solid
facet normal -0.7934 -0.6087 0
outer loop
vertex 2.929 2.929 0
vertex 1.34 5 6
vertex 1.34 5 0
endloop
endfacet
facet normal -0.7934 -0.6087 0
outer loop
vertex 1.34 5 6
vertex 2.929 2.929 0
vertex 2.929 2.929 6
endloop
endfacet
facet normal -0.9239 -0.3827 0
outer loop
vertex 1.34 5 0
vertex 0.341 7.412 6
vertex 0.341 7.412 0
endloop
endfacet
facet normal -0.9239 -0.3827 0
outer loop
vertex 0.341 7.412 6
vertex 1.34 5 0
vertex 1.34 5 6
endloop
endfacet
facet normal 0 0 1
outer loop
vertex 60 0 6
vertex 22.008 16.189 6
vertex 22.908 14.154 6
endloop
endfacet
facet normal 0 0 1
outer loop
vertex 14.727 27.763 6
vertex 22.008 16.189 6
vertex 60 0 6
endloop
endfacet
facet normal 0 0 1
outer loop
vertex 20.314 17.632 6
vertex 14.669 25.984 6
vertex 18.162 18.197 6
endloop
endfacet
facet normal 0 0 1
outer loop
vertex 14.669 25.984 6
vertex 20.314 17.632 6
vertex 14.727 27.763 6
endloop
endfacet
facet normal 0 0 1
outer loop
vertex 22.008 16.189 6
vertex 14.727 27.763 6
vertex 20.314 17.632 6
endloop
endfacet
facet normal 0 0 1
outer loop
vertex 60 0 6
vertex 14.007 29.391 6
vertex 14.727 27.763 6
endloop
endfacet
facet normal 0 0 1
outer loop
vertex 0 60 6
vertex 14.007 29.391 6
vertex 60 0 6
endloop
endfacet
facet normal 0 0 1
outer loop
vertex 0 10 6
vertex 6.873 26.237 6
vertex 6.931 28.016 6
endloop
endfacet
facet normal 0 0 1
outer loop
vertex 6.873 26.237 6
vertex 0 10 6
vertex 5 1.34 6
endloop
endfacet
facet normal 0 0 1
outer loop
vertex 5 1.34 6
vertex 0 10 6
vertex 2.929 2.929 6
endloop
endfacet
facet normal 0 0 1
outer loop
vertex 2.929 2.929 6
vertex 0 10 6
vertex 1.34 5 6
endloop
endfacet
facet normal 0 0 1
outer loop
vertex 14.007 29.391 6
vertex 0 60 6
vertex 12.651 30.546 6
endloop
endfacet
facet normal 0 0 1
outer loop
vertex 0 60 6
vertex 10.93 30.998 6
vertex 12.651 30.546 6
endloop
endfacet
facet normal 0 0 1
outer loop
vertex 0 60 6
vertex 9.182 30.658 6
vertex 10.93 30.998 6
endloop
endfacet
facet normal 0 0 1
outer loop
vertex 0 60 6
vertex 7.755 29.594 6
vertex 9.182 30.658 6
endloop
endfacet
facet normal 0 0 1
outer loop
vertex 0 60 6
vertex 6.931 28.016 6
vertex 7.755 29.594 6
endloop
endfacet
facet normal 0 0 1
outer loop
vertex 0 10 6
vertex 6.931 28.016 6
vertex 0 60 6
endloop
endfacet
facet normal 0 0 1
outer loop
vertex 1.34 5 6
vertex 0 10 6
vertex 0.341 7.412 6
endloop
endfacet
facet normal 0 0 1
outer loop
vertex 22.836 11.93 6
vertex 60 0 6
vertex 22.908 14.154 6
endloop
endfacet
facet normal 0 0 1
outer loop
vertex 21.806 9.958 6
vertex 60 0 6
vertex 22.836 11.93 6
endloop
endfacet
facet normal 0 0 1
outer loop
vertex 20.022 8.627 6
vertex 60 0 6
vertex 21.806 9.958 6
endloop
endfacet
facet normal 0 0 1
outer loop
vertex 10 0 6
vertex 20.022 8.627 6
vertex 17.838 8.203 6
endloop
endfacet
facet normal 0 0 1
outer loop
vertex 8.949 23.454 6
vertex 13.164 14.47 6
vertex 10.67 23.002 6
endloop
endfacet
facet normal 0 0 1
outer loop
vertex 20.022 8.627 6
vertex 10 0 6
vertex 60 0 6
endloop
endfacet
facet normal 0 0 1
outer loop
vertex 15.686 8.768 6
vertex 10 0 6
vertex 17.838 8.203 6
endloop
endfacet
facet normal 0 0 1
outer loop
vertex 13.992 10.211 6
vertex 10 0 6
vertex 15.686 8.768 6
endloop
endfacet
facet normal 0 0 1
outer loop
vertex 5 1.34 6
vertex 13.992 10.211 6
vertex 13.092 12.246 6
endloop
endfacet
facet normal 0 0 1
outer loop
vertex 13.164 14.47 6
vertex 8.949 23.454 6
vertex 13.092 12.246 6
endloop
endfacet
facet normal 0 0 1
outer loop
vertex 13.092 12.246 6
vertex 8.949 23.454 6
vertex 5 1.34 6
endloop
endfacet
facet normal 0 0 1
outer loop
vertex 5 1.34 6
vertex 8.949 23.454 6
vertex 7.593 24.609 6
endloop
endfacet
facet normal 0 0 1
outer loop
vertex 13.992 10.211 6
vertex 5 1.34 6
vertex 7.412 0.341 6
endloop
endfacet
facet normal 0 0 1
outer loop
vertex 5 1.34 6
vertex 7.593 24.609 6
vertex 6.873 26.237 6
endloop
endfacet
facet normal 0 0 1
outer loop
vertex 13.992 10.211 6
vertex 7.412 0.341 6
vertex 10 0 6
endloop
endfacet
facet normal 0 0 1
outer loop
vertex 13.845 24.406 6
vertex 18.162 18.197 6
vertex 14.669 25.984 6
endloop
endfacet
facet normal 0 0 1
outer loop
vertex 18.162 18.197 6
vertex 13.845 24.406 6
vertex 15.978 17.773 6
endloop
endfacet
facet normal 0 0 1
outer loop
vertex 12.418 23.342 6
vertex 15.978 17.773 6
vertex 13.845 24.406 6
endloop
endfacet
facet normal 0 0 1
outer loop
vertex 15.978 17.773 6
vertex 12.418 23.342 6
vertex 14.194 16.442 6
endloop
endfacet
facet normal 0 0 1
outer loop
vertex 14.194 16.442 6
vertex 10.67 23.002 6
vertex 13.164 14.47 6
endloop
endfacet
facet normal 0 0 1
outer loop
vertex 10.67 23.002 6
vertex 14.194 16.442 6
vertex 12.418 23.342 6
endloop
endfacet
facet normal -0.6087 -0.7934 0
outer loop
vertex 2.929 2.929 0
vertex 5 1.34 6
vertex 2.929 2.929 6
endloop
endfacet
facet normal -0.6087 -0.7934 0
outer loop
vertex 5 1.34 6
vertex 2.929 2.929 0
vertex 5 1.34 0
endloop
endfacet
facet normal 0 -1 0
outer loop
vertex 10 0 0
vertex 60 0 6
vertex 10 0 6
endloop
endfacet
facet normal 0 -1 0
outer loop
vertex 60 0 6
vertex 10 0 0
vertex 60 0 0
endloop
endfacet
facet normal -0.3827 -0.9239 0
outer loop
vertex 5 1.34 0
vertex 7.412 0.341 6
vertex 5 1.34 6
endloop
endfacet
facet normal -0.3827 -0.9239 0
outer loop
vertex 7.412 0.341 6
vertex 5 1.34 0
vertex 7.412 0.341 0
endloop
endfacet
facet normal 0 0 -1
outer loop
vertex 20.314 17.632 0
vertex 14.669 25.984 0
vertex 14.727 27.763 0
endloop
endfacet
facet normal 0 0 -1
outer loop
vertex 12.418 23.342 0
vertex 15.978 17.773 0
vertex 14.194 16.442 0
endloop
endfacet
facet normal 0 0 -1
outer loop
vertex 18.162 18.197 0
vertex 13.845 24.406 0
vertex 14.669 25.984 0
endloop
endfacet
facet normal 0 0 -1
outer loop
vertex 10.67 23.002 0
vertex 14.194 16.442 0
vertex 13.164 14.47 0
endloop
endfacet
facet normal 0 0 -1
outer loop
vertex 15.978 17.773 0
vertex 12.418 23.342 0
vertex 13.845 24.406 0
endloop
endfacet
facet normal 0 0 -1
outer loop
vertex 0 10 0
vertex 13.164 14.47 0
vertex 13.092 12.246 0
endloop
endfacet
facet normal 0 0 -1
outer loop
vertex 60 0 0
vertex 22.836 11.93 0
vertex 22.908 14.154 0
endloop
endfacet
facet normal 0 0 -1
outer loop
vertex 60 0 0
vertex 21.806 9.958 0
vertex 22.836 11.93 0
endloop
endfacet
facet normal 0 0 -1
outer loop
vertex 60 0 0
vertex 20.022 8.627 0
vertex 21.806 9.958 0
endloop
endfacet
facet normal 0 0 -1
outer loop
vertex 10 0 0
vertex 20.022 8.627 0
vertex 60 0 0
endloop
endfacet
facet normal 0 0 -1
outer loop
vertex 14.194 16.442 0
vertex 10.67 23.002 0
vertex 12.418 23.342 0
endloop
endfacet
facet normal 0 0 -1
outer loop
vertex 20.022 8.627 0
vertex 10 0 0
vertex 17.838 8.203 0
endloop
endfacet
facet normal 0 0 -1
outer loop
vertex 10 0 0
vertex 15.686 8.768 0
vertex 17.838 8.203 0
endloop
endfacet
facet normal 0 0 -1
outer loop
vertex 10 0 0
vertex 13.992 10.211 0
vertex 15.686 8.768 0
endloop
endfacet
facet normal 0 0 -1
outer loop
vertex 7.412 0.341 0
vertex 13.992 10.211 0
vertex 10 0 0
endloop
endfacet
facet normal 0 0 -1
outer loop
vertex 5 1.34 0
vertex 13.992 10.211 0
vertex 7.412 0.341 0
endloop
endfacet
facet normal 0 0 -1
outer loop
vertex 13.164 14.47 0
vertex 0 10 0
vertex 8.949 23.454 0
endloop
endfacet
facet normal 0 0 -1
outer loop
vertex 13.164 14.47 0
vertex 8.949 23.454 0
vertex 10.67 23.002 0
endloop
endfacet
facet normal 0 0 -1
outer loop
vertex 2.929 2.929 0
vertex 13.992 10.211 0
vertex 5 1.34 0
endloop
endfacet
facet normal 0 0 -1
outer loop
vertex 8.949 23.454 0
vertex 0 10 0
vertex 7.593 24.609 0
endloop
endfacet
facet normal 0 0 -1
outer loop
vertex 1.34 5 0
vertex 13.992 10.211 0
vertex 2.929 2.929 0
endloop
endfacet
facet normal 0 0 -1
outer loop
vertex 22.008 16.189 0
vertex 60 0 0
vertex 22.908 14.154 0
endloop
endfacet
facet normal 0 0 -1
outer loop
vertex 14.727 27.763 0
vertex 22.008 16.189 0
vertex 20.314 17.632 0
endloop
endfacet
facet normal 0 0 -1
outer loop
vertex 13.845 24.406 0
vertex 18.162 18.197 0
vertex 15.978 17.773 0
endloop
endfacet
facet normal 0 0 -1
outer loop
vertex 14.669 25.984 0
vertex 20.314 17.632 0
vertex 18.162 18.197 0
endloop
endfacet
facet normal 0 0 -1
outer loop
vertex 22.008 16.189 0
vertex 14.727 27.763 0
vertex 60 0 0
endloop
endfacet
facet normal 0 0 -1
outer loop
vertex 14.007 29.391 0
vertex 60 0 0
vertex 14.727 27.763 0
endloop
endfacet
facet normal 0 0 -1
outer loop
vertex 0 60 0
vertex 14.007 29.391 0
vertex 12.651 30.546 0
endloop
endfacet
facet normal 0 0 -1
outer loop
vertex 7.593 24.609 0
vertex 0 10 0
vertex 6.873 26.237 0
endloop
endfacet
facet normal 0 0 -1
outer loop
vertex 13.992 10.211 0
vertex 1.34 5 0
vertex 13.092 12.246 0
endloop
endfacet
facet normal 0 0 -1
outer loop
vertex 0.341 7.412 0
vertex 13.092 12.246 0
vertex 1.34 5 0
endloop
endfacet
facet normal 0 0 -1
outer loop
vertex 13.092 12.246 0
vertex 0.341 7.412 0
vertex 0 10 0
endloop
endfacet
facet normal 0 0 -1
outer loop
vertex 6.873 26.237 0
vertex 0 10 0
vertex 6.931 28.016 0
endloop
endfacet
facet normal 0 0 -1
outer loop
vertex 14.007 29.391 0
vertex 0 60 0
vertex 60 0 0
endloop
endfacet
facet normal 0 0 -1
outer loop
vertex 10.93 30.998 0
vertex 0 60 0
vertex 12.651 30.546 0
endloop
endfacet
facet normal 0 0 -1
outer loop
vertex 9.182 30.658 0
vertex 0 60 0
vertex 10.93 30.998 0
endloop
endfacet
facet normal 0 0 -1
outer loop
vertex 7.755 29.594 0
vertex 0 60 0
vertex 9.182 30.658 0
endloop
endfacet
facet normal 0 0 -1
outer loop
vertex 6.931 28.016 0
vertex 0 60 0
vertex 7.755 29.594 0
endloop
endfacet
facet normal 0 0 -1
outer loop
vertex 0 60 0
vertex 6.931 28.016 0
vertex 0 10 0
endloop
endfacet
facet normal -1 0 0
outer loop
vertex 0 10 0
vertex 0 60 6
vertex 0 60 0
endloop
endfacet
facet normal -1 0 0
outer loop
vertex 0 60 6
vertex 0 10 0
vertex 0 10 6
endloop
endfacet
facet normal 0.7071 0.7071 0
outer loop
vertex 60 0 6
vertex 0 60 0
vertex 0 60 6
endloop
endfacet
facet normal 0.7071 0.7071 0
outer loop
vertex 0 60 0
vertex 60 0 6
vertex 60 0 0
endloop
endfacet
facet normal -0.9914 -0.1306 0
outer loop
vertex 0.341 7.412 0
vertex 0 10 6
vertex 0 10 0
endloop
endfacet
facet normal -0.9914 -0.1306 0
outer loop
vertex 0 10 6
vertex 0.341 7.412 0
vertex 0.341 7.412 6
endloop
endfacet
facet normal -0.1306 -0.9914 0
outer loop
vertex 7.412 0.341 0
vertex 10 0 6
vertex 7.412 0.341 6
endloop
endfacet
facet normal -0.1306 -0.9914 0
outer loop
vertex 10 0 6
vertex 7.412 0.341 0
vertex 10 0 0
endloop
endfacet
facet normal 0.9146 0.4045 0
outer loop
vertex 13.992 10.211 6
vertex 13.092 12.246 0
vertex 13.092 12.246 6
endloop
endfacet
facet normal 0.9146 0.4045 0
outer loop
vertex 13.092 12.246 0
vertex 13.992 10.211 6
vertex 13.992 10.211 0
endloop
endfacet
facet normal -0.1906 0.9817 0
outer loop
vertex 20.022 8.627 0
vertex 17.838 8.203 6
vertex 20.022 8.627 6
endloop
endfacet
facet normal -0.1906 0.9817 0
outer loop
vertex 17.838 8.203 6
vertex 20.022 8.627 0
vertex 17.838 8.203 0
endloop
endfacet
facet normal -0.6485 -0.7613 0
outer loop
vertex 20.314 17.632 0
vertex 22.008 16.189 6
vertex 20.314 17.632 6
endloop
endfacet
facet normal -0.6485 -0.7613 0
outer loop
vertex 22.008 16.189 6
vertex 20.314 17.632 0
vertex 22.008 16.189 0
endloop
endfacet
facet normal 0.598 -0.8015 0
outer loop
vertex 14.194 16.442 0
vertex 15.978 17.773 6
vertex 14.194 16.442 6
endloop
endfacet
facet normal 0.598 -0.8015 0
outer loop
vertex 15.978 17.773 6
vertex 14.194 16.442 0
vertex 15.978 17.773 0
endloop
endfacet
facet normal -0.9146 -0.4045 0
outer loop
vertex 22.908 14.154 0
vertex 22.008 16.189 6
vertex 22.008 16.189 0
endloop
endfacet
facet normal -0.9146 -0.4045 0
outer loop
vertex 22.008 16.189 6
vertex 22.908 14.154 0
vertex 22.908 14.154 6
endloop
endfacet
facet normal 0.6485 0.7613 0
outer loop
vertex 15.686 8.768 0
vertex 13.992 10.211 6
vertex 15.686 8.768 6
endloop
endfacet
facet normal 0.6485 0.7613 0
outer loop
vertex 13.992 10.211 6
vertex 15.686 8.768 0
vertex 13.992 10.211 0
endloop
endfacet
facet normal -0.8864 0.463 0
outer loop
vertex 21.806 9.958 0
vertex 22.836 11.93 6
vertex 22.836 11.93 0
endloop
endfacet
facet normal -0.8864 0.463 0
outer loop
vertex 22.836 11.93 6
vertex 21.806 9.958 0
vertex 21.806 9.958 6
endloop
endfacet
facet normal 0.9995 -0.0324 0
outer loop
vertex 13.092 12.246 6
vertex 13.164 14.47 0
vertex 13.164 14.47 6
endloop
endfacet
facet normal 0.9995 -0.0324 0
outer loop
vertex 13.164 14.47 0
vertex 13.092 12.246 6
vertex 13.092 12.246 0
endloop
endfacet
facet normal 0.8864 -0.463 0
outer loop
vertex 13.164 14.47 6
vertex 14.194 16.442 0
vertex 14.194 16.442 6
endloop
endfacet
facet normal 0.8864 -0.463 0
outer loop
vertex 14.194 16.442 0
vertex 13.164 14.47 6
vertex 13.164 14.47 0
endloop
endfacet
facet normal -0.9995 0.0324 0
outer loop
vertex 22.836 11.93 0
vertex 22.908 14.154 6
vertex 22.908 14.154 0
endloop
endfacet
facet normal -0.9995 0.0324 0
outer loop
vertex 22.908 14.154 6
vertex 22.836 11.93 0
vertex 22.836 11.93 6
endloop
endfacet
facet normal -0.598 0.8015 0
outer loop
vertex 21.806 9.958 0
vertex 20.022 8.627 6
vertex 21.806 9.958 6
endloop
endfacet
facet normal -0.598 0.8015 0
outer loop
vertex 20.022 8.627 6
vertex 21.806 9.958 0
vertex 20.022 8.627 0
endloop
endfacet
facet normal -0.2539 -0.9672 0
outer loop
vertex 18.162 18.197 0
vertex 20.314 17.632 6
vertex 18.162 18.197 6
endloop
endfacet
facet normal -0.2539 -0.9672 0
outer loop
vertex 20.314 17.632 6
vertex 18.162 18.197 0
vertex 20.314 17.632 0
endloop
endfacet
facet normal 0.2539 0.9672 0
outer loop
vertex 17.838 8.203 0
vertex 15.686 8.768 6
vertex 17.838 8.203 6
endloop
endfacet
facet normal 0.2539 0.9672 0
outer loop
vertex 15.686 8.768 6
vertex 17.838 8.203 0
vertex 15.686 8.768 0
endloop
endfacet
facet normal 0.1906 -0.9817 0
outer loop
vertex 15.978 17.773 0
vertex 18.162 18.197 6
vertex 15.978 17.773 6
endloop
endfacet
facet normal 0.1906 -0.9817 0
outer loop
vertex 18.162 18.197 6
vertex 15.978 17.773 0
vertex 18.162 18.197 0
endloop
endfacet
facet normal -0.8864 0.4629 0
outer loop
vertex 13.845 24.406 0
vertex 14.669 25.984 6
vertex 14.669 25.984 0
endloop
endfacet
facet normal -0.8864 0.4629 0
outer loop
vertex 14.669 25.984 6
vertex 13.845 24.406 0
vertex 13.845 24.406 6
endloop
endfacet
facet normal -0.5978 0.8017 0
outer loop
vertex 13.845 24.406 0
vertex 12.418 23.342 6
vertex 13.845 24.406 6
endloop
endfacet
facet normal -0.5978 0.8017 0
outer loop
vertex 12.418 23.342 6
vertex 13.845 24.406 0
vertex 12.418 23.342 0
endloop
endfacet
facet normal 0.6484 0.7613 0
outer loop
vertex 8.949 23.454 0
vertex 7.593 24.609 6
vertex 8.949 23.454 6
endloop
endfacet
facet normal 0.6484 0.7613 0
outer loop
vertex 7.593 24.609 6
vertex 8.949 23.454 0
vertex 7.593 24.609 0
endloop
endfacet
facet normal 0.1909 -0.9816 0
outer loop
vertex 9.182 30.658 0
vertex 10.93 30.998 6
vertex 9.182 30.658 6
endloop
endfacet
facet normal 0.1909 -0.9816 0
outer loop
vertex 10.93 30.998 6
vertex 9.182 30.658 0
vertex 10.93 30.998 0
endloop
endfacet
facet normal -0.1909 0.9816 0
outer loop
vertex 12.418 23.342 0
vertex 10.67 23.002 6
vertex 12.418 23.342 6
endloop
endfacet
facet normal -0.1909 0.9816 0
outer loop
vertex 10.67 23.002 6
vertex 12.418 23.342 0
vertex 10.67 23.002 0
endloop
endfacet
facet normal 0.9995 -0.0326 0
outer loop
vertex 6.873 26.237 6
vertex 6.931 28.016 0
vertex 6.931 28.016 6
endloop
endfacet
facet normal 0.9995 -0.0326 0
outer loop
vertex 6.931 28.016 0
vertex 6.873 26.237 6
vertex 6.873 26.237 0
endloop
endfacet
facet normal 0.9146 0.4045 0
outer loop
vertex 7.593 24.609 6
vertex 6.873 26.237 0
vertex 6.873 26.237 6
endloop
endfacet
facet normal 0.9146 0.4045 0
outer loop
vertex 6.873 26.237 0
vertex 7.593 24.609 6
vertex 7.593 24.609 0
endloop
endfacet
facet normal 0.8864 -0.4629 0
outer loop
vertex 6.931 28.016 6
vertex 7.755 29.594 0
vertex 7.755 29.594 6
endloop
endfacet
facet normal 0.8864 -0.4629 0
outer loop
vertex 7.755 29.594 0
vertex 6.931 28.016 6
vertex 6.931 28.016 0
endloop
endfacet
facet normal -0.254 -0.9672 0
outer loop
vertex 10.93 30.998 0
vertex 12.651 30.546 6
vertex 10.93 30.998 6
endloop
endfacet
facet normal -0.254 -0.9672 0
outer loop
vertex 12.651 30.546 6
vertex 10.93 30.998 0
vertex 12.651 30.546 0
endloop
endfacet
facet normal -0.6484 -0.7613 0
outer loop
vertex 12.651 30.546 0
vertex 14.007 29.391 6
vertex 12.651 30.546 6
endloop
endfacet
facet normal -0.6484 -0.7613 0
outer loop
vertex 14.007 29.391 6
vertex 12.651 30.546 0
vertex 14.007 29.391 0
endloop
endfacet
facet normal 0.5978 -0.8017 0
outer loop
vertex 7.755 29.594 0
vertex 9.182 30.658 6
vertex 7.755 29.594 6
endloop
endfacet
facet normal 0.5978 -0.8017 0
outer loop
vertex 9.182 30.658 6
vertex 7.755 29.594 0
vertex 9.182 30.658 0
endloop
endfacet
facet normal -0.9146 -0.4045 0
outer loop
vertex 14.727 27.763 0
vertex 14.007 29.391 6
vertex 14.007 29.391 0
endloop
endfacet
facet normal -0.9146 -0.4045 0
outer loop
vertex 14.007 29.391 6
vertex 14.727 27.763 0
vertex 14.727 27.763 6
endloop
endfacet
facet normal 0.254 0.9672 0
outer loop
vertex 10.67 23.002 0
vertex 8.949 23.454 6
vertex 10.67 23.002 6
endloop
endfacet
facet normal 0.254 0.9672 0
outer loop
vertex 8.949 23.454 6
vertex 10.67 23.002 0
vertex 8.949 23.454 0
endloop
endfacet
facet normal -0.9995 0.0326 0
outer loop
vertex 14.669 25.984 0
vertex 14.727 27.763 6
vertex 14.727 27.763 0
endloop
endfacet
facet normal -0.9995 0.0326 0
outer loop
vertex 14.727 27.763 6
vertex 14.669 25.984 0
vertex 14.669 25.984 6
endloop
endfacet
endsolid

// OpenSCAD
$fn = 32;

// ----------------------------------------------------------------------
// Bracket plate: corner pad 60 x 60, fillet R10
// ----------------------------------------------------------------------

// --- parameters (mm) ---
hole_r = 4;               // bolt hole radius
plate_t = 6;              // plate thickness, Z (extrusion height)
leg_a = 60;               // base leg
leg_b = 60;               // height leg
fillet_r = 10;            // right-angle fillet radius

hole_d1 = 2 * hole_r + 2;
hole_d2 = 2 * hole_r;

profile = [[10, 0], [60, 0], [0, 60], [0, 10], [0.341, 7.412], [1.34, 5], [2.929, 2.929], [5, 1.34], [7.412, 0.341]];  // primary outline, 9 points, counter clockwise
void_1 = [[22.908, 14.154], [22.008, 16.189], [20.314, 17.632], [18.162, 18.197], [15.978, 17.773], [14.194, 16.442], [13.164, 14.47], [13.092, 12.246], [13.992, 10.211], [15.686, 8.768], [17.838, 8.203], [20.022, 8.627], [21.806, 9.958], [22.836, 11.93]];  // mount hole 1, 14 points
void_2 = [[14.727, 27.763], [14.007, 29.391], [12.651, 30.546], [10.93, 30.998], [9.182, 30.658], [7.755, 29.594], [6.931, 28.016], [6.873, 26.237], [7.593, 24.609], [8.949, 23.454], [10.67, 23.002], [12.418, 23.342], [13.845, 24.406], [14.669, 25.984]];  // mount hole 2, 14 points

// --- the one profile operation ---
difference() {
  linear_extrude(height = plate_t) polygon(points = profile);
  translate([0, 0, -1])
    linear_extrude(height = plate_t + 2) polygon(points = void_1);
  translate([0, 0, -1])
    linear_extrude(height = plate_t + 2) polygon(points = void_2);
}
